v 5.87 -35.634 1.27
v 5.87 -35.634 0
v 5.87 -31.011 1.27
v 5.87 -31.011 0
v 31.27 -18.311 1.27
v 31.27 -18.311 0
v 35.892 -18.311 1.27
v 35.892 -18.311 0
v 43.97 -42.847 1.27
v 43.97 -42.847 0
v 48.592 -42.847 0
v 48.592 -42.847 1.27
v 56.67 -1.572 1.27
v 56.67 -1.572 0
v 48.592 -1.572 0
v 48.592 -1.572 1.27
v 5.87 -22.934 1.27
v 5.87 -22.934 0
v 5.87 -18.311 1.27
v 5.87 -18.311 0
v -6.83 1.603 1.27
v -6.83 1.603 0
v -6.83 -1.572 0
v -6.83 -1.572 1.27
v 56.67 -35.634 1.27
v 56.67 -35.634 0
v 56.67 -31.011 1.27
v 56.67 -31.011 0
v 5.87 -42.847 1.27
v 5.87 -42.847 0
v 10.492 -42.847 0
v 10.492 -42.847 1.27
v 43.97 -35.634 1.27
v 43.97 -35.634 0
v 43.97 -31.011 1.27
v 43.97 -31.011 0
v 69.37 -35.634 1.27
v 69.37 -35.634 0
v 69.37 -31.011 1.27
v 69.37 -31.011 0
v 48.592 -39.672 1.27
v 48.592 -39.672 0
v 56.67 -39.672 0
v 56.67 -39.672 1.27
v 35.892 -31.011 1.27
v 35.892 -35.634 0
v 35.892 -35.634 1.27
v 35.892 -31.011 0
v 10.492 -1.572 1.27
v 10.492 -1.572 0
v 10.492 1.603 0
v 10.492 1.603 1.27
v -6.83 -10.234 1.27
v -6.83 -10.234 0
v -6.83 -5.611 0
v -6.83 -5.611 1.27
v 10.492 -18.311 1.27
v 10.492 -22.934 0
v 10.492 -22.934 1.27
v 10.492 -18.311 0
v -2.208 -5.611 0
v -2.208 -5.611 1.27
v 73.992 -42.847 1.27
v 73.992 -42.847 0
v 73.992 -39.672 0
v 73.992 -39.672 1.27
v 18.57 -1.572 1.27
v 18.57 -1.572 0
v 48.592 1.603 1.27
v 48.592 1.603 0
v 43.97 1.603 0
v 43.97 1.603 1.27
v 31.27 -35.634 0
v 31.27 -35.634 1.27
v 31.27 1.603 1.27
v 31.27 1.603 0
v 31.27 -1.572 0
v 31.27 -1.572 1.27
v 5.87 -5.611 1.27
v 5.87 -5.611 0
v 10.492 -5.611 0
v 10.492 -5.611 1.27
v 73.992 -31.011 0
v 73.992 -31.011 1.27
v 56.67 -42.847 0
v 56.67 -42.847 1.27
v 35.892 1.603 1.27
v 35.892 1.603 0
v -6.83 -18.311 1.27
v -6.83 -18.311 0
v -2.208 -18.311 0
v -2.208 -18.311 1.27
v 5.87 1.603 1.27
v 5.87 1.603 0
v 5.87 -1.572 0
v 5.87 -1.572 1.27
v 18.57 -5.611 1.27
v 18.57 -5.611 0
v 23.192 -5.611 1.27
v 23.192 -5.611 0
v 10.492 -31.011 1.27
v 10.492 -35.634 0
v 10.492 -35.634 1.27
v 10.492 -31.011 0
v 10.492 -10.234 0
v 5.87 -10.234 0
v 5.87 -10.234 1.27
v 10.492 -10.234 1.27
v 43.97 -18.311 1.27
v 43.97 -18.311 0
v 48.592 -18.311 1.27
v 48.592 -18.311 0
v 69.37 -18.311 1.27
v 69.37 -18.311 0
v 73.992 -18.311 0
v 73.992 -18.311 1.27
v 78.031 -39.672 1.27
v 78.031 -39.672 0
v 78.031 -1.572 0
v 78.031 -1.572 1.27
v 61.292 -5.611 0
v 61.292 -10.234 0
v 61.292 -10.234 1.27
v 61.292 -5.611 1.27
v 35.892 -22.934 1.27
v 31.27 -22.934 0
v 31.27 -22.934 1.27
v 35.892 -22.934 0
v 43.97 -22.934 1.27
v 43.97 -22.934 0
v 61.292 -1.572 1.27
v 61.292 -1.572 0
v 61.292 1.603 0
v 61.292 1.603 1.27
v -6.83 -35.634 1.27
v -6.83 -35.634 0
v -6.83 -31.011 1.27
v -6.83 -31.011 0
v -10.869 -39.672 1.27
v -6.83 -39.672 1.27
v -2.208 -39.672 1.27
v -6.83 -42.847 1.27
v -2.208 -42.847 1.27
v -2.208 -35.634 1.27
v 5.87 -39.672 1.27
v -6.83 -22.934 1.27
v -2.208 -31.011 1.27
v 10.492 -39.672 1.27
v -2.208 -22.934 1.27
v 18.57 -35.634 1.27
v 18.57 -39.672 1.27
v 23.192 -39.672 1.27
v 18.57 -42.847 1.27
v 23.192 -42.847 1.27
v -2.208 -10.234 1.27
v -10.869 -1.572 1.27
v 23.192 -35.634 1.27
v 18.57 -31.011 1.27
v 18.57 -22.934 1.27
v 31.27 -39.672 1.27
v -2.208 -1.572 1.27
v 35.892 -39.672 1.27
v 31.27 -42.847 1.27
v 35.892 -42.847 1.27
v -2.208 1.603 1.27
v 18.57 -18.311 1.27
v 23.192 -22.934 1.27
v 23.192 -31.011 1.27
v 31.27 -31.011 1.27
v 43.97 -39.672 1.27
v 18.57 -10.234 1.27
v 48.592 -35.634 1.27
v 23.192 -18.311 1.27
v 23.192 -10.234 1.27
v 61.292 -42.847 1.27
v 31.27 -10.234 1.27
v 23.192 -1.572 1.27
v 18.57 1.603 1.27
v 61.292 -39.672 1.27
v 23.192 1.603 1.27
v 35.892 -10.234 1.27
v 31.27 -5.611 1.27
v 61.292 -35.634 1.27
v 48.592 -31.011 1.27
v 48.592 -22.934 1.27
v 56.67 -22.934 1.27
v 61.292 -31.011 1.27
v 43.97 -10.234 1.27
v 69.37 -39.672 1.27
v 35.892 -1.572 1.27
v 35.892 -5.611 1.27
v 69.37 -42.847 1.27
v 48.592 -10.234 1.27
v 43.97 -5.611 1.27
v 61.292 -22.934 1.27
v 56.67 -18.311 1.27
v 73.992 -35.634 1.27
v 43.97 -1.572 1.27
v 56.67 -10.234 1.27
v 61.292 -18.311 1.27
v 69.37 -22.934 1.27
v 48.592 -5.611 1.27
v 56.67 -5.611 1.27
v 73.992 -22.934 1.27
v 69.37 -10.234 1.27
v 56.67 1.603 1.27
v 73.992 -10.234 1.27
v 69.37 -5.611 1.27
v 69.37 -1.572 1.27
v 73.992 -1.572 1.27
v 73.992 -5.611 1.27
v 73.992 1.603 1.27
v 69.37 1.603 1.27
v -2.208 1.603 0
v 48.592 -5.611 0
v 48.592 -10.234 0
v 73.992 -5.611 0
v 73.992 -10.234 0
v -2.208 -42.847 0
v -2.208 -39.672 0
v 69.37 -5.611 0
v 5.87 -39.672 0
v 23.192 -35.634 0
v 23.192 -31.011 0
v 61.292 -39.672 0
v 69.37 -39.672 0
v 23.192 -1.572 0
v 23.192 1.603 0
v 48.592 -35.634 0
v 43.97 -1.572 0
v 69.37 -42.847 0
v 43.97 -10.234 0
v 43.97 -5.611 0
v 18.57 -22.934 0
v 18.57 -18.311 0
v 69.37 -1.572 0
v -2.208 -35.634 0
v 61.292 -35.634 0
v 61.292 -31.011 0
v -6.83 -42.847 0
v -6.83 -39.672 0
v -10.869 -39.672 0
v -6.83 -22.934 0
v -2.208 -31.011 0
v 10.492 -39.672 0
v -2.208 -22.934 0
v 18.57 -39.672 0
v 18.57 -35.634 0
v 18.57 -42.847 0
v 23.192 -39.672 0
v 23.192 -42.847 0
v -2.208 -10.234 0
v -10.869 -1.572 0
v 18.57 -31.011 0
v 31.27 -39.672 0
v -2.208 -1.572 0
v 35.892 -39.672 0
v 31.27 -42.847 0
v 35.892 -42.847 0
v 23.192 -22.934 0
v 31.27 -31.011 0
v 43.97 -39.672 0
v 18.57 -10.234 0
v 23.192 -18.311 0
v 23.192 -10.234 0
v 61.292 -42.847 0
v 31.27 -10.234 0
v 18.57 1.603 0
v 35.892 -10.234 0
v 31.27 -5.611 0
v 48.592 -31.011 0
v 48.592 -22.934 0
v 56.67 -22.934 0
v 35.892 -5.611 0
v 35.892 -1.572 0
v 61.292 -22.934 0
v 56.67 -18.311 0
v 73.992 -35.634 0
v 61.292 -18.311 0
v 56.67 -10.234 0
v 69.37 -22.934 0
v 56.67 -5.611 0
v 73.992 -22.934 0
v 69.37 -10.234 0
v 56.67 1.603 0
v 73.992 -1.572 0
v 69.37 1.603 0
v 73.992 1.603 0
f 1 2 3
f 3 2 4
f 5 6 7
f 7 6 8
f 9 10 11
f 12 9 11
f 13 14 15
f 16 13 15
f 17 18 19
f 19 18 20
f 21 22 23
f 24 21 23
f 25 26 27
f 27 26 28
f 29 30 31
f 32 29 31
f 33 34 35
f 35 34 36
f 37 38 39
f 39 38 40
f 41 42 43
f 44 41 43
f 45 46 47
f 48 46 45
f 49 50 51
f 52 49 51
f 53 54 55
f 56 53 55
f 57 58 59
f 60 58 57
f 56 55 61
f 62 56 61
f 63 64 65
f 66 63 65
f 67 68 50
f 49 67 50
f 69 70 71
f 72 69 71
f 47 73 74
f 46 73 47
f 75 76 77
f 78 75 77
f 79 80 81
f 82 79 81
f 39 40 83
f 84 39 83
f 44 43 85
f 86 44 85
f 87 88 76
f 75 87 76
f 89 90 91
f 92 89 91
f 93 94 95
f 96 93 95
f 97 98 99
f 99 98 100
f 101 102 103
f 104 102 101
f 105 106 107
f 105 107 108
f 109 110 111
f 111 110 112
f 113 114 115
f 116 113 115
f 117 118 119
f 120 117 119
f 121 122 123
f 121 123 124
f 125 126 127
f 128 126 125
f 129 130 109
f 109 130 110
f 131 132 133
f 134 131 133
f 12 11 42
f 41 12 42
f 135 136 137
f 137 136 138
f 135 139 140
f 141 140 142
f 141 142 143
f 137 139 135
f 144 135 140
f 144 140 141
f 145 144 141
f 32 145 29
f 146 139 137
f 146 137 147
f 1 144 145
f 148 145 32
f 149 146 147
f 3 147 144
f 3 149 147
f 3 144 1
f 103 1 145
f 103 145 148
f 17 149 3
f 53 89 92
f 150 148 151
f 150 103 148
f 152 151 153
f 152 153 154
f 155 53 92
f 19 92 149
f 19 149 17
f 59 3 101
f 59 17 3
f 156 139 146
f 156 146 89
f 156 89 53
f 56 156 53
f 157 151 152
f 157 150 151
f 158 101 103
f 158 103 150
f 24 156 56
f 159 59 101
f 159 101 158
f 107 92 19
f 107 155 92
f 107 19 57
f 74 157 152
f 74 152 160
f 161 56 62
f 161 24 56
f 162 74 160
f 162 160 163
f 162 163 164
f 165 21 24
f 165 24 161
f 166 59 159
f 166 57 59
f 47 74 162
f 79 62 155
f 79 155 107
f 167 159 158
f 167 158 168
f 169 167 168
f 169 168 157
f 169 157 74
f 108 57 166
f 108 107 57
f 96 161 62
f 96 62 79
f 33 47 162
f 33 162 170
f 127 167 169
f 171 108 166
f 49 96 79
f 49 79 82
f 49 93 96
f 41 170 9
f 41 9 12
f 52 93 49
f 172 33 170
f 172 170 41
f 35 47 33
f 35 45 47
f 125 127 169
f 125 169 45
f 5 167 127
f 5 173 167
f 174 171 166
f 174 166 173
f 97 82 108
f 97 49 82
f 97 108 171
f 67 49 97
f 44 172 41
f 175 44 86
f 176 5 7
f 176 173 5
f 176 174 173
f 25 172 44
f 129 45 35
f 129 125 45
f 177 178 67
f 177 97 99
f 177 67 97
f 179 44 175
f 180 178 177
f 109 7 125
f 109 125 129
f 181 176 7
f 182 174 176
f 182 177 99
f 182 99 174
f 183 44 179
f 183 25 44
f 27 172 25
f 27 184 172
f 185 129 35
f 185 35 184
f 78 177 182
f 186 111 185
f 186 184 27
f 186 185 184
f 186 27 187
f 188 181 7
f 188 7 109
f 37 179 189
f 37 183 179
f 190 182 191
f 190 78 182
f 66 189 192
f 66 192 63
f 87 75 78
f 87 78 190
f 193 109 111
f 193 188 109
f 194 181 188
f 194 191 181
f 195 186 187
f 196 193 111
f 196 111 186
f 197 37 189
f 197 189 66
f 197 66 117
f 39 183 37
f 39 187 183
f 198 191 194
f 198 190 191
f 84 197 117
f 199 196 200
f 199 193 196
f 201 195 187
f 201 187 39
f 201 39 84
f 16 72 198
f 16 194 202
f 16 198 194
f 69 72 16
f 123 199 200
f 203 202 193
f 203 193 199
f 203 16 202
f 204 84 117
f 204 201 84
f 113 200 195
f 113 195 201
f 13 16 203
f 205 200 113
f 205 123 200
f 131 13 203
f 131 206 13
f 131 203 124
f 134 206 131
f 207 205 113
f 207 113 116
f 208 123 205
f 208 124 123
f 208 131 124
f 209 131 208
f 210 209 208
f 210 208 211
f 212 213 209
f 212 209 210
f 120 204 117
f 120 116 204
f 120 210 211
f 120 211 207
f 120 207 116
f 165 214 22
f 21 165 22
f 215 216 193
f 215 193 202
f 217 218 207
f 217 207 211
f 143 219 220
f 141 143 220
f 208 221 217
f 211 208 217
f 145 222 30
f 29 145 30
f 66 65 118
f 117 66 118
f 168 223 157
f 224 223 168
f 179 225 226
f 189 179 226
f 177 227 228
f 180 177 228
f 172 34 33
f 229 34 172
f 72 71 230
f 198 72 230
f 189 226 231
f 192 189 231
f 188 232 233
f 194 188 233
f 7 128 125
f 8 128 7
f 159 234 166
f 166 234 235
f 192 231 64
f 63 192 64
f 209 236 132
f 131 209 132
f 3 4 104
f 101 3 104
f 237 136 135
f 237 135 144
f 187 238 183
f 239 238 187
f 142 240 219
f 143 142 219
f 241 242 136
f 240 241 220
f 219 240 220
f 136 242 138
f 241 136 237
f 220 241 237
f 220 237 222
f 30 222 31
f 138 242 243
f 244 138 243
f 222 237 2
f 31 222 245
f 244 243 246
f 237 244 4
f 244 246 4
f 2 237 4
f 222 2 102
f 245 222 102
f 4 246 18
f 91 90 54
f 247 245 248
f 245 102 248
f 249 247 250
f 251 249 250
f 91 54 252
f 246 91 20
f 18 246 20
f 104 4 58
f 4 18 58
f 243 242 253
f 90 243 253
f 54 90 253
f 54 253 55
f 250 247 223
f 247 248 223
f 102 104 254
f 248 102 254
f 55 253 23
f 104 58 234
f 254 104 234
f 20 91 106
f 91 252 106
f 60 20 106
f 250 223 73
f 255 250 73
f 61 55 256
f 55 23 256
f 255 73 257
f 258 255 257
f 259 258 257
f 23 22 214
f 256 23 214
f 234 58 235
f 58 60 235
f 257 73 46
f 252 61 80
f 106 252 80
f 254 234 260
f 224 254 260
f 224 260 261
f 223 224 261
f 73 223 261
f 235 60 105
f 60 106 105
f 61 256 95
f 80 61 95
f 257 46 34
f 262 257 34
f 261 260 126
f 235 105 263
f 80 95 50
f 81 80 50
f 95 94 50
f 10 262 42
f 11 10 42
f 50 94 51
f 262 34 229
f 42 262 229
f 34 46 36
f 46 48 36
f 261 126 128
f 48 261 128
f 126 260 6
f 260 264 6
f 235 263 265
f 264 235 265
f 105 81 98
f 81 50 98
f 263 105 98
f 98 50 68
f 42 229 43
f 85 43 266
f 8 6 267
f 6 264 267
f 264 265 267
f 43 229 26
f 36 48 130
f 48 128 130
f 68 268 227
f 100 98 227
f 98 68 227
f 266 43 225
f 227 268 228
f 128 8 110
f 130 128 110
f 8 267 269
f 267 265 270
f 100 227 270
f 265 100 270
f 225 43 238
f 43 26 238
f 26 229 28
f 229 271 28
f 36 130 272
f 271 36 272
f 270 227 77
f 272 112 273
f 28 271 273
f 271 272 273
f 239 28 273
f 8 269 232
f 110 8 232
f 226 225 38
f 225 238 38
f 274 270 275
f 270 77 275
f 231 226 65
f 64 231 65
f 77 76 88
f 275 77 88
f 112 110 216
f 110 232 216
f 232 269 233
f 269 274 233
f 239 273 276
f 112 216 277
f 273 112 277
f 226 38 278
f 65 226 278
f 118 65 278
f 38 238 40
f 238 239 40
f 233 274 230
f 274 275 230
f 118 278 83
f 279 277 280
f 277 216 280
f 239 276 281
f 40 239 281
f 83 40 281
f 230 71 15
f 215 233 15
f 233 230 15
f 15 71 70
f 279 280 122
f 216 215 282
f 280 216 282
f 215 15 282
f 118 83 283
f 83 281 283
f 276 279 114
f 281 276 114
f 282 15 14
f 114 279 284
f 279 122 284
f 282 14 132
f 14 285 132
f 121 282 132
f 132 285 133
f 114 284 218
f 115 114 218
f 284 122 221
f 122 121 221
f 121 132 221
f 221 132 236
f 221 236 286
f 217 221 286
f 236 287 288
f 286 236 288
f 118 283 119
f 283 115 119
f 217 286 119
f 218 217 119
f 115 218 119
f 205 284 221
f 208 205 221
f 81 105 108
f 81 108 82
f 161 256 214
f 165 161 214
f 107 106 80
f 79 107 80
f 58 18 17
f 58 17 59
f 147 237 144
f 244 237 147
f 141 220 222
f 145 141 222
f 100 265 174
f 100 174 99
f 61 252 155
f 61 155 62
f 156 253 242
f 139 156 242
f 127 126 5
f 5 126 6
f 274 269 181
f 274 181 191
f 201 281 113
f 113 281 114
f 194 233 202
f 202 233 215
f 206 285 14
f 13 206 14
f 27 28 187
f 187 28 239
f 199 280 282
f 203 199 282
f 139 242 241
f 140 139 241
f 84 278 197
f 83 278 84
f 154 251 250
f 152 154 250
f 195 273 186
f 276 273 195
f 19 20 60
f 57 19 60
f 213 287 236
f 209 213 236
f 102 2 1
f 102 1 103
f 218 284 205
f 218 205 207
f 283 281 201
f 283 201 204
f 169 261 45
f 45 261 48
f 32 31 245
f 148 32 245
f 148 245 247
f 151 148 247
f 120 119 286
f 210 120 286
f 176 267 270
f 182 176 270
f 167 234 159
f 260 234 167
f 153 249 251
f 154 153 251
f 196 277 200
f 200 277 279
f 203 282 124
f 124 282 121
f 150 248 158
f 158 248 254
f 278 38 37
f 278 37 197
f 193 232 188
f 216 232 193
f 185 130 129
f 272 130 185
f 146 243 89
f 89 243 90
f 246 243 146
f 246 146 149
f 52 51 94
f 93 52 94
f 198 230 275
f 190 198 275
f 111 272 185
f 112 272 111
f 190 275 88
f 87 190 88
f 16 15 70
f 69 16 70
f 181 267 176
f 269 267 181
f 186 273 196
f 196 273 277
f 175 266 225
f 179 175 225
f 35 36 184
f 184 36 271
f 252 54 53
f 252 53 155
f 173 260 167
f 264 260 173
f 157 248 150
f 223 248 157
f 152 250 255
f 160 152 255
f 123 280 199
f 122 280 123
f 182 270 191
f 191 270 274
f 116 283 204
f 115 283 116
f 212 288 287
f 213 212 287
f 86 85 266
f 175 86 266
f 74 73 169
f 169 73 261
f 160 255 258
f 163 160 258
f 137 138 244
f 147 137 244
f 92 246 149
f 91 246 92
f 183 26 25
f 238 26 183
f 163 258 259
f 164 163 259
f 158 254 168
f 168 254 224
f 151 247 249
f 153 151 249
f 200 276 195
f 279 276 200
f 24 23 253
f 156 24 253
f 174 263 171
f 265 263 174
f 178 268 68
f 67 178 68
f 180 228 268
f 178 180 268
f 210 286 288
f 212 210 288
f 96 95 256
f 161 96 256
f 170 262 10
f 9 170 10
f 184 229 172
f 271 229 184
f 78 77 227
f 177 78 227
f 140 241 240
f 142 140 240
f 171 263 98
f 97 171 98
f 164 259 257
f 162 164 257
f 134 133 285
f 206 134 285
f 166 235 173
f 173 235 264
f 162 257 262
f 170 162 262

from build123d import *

# Parameters (mm, degrees)
F0_W     = 4.6228
F0_H     = 4.6228
F1_DEPTH = 1.27


with BuildPart() as f1:
    # F0 (on Top) → F1 (new body)
    with BuildSketch(Plane.XY):
        Polygon((78.031066, -39.672382), (78.031066, -1.572382), (73.992466, -1.572382), (73.992466, 1.602618), (69.369666, 1.602618), (69.369666, -1.572382), (61.292466, -1.572382), (61.292466, 1.602618), (56.669666, 1.602618), (56.669666, -1.572382), (48.592466, -1.572382), (48.592466, 1.602618), (43.969666, 1.602618), (43.969666, -1.572382), (35.892466, -1.572382), (35.892466, 1.602618), (31.269666, 1.602618), (31.269666, -1.572382), (23.192466, -1.572382), (23.192466, 1.602618), (18.569666, 1.602618), (18.569666, -1.572382), (10.492466, -1.572382), (10.492466, 1.602618), (5.869666, 1.602618), (5.869666, -1.572382), (-2.207534, -1.572382), (-2.207534, 1.602618), (-6.830334, 1.602618), (-6.830334, -1.572382), (-10.868934, -1.572382), (-10.868934, -33.322382), (-10.868934, -39.672382), (-6.830334, -39.672382), (-6.830334, -42.847382), (-2.207534, -42.847382), (-2.207534, -39.672382), (5.869666, -39.672382), (5.869666, -42.847382), (10.492466, -42.847382), (10.492466, -39.672382), (18.569666, -39.672382), (18.569666, -42.847382), (23.192466, -42.847382), (23.192466, -39.672382), (31.269666, -39.672382), (31.269666, -42.847382), (35.892466, -42.847382), (35.892466, -39.672382), (43.969666, -39.672382), (43.969666, -42.847382), (48.592466, -42.847382), (48.592466, -39.672382), (56.669666, -39.672382), (56.669666, -42.847382), (61.292466, -42.847382), (61.292466, -39.672382), (69.369666, -39.672382), (69.369666, -42.847382), (73.992466, -42.847382), (73.992466, -39.672382), align=None)
        with Locations((-4.518934, -33.322382)):
            Rectangle(F0_W, F0_H, mode=Mode.SUBTRACT)
        with Locations((8.181066, -33.322382)):
            Rectangle(F0_W, F0_H, mode=Mode.SUBTRACT)
        with Locations((20.881066, -33.322382)):
            Rectangle(F0_W, F0_H, mode=Mode.SUBTRACT)
        with Locations((33.581066, -33.322382)):
            Rectangle(F0_W, F0_H, mode=Mode.SUBTRACT)
        with Locations((46.281066, -33.322382)):
            Rectangle(F0_W, F0_H, mode=Mode.SUBTRACT)
        with Locations((58.981066, -33.322382)):
            Rectangle(F0_W, F0_H, mode=Mode.SUBTRACT)
        with Locations((71.681066, -33.322382)):
            Rectangle(F0_W, F0_H, mode=Mode.SUBTRACT)
        with Locations((-4.518934, -20.622382)):
            Rectangle(F0_W, F0_H, mode=Mode.SUBTRACT)
        with Locations((8.181066, -20.622382)):
            Rectangle(F0_W, F0_H, mode=Mode.SUBTRACT)
        with Locations((20.881066, -20.622382)):
            Rectangle(F0_W, F0_H, mode=Mode.SUBTRACT)
        with Locations((-4.518934, -7.922382)):
            Rectangle(F0_W, F0_H, mode=Mode.SUBTRACT)
        with Locations((8.181066, -7.922382)):
            Rectangle(F0_W, F0_H, mode=Mode.SUBTRACT)
        with Locations((20.881066, -7.922382)):
            Rectangle(F0_W, F0_H, mode=Mode.SUBTRACT)
        with Locations((33.581066, -20.622382)):
            Rectangle(F0_W, F0_H, mode=Mode.SUBTRACT)
        with Locations((46.281066, -20.622382)):
            Rectangle(F0_W, F0_H, mode=Mode.SUBTRACT)
        with Locations((58.981066, -20.622382)):
            Rectangle(F0_W, F0_H, mode=Mode.SUBTRACT)
        with Locations((71.681066, -20.622382)):
            Rectangle(F0_W, F0_H, mode=Mode.SUBTRACT)
        with Locations((33.581066, -7.922382)):
            Rectangle(F0_W, F0_H, mode=Mode.SUBTRACT)
        with Locations((46.281066, -7.922382)):
            Rectangle(F0_W, F0_H, mode=Mode.SUBTRACT)
        with Locations((58.981066, -7.922382)):
            Rectangle(F0_W, F0_H, mode=Mode.SUBTRACT)
        with Locations((71.681066, -7.922382)):
            Rectangle(F0_W, F0_H, mode=Mode.SUBTRACT)
    extrude(amount=F1_DEPTH)


solid = f1.part
